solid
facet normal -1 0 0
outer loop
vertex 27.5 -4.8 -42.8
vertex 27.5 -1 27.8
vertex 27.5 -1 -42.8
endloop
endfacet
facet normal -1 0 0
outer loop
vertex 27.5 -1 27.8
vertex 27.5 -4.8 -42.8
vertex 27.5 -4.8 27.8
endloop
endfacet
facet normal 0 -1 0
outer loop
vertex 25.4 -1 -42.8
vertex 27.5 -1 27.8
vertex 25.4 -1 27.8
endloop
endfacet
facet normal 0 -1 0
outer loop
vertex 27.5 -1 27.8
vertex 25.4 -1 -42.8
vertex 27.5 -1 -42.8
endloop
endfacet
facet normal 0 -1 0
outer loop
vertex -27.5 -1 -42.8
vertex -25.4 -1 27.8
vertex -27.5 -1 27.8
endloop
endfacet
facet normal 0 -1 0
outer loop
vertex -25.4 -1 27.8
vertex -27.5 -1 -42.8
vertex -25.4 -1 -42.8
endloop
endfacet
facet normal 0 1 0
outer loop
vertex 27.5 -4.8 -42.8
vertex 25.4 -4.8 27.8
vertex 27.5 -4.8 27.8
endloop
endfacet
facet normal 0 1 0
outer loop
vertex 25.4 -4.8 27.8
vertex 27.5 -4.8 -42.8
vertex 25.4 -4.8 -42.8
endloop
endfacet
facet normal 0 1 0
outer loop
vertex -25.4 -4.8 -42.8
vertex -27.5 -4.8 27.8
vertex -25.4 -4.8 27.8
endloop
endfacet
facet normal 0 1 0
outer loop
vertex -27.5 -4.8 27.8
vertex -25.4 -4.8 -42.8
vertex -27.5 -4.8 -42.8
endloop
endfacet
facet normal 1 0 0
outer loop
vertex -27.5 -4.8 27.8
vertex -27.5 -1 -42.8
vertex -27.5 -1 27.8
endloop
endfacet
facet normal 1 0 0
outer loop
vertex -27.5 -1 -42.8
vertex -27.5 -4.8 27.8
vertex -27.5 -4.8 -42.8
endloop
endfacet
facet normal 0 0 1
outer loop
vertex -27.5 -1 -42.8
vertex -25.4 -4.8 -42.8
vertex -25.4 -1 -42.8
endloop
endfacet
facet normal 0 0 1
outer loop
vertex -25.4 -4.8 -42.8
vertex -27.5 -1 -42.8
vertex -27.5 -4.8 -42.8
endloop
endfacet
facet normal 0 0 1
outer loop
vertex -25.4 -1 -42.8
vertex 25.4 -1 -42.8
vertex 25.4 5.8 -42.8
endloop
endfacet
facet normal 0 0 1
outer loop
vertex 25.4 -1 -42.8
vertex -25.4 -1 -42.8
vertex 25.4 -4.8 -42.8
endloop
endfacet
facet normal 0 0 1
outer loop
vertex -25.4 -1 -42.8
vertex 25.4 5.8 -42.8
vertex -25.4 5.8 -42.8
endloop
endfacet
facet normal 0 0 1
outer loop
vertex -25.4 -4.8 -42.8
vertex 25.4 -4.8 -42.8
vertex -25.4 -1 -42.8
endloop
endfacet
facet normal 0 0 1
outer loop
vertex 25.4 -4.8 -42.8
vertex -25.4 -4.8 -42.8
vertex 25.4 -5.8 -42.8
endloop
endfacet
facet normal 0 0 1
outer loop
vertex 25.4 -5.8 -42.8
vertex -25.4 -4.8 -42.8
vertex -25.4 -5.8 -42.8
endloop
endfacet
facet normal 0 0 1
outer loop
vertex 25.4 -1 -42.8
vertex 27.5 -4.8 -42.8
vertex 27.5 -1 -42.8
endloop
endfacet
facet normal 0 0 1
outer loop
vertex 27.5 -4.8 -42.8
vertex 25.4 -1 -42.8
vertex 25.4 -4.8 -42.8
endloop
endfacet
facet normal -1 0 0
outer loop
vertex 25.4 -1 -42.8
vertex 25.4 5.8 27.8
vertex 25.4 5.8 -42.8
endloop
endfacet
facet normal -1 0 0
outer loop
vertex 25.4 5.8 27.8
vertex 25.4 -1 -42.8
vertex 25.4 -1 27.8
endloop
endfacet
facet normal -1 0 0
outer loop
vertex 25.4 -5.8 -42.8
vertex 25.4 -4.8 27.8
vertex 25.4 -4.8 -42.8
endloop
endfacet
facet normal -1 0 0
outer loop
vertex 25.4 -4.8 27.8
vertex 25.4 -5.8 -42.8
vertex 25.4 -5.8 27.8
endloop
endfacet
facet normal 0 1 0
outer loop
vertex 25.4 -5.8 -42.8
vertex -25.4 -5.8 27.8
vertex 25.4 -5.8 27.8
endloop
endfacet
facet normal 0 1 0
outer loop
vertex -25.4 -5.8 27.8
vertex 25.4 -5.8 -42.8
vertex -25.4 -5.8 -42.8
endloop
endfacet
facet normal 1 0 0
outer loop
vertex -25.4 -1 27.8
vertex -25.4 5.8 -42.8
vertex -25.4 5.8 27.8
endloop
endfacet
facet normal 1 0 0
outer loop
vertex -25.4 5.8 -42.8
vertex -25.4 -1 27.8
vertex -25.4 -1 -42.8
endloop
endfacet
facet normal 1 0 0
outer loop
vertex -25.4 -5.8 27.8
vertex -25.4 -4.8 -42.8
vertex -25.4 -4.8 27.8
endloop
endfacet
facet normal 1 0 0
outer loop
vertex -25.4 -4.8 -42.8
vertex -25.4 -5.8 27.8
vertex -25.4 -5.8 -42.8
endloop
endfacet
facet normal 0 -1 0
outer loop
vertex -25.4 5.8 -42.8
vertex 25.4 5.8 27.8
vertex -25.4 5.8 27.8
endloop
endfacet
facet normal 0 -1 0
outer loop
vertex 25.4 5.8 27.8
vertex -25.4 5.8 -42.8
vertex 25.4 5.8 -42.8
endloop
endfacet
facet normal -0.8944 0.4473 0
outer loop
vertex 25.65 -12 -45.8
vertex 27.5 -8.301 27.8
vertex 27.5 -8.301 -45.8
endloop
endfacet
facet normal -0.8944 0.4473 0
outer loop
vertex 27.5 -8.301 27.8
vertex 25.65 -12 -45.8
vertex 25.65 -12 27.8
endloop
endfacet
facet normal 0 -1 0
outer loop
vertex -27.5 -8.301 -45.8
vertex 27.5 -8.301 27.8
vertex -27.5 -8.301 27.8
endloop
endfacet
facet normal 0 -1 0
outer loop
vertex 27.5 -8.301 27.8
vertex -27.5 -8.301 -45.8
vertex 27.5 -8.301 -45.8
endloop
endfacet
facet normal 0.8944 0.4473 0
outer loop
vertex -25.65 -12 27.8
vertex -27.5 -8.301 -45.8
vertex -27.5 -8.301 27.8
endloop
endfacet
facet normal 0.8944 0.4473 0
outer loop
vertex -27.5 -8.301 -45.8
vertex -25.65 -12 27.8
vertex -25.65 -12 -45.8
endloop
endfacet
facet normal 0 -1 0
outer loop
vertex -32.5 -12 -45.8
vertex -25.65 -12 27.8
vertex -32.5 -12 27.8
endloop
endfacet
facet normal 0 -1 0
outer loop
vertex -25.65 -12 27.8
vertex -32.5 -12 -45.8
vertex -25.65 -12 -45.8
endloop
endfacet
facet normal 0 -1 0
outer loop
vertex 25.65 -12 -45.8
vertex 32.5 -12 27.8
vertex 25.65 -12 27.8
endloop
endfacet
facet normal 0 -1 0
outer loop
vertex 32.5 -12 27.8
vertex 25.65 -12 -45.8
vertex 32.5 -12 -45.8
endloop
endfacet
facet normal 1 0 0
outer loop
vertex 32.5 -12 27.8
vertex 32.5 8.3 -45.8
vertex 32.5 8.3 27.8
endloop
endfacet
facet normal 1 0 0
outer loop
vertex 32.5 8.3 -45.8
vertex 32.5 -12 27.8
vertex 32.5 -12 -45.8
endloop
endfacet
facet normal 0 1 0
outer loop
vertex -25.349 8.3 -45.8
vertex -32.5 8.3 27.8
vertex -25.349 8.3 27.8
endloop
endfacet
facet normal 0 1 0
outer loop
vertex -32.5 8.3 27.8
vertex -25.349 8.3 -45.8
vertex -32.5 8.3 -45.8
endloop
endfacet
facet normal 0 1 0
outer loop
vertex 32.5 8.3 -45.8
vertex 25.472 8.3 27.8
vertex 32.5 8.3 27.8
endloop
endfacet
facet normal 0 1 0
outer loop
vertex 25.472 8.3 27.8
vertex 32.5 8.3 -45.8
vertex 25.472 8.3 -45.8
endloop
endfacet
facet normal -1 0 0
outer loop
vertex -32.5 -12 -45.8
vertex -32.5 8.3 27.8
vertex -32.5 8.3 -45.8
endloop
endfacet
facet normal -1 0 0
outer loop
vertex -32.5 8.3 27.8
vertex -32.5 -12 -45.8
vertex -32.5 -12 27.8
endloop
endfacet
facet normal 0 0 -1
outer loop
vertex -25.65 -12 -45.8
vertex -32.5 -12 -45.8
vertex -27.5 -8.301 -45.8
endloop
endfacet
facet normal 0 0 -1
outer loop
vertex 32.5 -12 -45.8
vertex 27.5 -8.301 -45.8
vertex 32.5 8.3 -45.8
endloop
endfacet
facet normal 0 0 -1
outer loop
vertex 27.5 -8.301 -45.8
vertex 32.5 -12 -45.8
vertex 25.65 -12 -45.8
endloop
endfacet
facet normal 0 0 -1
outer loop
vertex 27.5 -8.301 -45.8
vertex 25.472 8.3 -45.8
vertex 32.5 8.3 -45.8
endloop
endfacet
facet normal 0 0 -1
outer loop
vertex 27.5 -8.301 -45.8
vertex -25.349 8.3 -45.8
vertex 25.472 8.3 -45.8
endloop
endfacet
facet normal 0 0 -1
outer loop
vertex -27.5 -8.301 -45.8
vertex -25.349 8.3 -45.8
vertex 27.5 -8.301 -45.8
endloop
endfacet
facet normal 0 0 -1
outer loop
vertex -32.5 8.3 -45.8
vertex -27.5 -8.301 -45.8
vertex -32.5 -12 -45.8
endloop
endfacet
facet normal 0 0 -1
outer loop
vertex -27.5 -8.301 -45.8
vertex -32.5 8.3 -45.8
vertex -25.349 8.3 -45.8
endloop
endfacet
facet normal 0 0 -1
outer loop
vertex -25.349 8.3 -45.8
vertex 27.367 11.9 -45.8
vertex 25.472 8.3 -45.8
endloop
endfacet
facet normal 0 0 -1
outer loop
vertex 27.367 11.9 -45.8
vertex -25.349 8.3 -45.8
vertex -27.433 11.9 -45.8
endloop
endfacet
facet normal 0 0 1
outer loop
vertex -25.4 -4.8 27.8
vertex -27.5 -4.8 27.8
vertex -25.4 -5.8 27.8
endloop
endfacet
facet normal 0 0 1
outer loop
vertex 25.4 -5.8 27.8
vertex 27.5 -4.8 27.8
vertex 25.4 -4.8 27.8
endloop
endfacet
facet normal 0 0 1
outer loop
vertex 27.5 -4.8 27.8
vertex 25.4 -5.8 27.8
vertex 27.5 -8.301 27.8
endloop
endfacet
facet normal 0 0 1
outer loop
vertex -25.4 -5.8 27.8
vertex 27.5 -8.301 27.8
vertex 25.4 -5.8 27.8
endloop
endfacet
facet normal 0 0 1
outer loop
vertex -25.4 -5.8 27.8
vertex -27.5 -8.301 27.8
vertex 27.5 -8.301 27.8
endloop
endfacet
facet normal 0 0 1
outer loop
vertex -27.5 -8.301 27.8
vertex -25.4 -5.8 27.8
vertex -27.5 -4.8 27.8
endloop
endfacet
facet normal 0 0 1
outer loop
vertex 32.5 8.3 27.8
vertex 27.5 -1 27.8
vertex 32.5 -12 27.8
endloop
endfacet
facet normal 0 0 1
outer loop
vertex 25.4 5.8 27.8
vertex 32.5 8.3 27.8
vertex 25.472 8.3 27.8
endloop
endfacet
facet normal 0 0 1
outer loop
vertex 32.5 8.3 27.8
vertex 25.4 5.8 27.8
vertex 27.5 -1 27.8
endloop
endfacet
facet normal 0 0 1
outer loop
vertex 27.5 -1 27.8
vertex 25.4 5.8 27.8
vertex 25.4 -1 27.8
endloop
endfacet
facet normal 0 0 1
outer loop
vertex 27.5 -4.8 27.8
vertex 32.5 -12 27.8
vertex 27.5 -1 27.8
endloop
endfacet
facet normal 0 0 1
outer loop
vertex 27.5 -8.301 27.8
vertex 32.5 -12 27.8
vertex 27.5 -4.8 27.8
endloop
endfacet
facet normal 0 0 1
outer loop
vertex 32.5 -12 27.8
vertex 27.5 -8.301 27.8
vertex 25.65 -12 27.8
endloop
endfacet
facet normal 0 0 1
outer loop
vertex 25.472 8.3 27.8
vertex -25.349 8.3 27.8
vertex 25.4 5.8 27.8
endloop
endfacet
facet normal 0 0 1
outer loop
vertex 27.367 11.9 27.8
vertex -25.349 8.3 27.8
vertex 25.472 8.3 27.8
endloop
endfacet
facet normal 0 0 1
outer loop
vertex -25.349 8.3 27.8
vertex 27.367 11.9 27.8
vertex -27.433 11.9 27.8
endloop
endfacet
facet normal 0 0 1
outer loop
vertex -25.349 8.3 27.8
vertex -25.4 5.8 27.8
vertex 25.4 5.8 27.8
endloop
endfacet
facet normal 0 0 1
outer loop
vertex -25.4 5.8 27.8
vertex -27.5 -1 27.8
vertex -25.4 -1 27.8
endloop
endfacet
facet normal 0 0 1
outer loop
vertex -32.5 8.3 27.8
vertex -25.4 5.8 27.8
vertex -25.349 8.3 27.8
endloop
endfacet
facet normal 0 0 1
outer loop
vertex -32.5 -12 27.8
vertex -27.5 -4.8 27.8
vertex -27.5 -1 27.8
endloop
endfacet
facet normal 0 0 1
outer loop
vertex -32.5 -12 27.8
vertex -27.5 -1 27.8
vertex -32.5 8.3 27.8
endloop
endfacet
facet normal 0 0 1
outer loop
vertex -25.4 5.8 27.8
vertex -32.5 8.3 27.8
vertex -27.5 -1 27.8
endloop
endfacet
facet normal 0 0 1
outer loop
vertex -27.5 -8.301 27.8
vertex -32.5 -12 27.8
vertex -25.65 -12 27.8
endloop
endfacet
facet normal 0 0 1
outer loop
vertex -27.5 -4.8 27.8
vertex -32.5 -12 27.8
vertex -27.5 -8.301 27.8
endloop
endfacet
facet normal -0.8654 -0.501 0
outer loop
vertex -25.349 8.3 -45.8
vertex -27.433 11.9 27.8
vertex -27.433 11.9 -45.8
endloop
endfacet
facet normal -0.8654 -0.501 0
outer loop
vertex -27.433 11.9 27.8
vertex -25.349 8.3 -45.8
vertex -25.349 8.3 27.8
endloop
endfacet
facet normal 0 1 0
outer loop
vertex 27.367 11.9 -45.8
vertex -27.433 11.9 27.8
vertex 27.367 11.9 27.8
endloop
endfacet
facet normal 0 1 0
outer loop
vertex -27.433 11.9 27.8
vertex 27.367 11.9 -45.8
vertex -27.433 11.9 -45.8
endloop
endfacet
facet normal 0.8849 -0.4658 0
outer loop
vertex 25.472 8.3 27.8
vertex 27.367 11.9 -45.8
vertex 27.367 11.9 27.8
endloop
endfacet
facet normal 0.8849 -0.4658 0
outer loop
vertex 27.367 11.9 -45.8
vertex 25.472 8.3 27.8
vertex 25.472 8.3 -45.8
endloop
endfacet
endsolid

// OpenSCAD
// file: lib/dovetail.scad
/**
 * dovetail.scad
 * A dovetail generator to easily lock modular pieces together.
 *
 * @author Nathan Campos <nathan@innoveworkshop.com>
 */

eps = 0.001;

/**
 * Creates a 2D trapezoid with a shrinking tolerance factor.
 *
 * @param w   Major width of the trapezoid.
 * @param h   Height of the trapezoid.
 * @param a   Side angle of the trapezoid.
 * @param tol Absolute amount to shrink the part as a whole.
 */
module trapezoid(w, h = 4, a = 2, tol = 0.4) {
	function at(val, t) = val + (tol / 2);
	function st(val, t) = val - (tol / 2);
	
	translate([st(-(w / 2)), st(-(h / 2)), 0])
		polygon(points = [[at(a), 0], [0, st(h)], [st(w), st(h)],
			[st(w - a), 0]]);
}

/**
 * Creates a male or female dovetail joint.
 *
 * @param gender Dovetail gender. ("male" or "female")
 * @param w      Width of the mating face.
 * @param d      Depth of the mating face.
 * @param sm     Margin from the side of the mating face to the end of the
 *               dovetail joint.
 * @param th     Dovetail trapezoid height.
 * @param ta     Side angle of the dovetail trapezoid.
 * @param tol    Absolute tolerance of the fit.
 */
module dovetail(gender, w, d, sm = 5, th = 4, ta = 2, tol = 0.4) {
	dt_eps = 0.001;

	if (gender == "male") {
		// Male Dovetail.
		translate([tol / 1.5, d / 2, th / 2])
		rotate([90, 0, 0])
		linear_extrude(d)
			trapezoid(w - (sm * 2), th, ta, tol);
	} else if (gender == "female") {
		union() {
			// Female dovetail.
			translate([0, (d / 2) + (dt_eps / 2), th / 2])
			rotate([90, 0, 0])
			linear_extrude(d + dt_eps)
				trapezoid(w - (sm * 2), th, ta, 0);
			
			// Tolerance of the fit. Removes a bit of height from the
			// mating surface.
			cube([w + dt_eps, d + dt_eps, tol + 0.2 + dt_eps], center = true);
		}
	} else {
		// Unknown gender.
		assert(false, "Unknown dovetail gender");
	}
}

/**
 * Creates a cap for a male dovetail to cover the last object in a modular
 * system.
 *
 * @param w Dovetail surface width.
 * @param d Dovetail surface depth.
 * @param h Cap height.
 */
module dovetail_cap(w, d, h) {
	difference() {
		cube([w, d, h], center = true);
	
		translate([0, 0, -h / 2])
			dovetail("female", w, d);
	}
}
// main file
/**
 * pcmcia-modular-organizer.scad
 * A modular PCMCIA card organizer tower.
 *
 * @author Nathan Campos <nathan@innoveworkshop.com>
 */

use <lib/dovetail.scad>

thing_to_build = "type3";  // type2, type3, base, top2, top3

// Generation parameters.
eps = 0.001;      // Epsilon overlap. 
side_wall = 5;    // Side wall width.
dt_margin = 2.5;  // Margin between the slot and the dovetail.
expo_depth = 15;  // Depth of card to leave exposed in front.

// PCMCIA card dimensions.
// For more information about the spec:
// https://support.dynabook.com/support/viewContentDetail?contentId=108256
pcmcia_depth = 85.6;     // Overall depth.
pcmcia_width = 55.0;     // Overall width.
pcmcia_cwidth = 50.8;    // Center section width.
pcmcia_cheight2 = 5.8;   // Center section height for Type II.
pcmcia_xcheight3 = 6.8;  // Center section extra height for Type III.
pcmcia_rheight = 3.8;    // Rail guide height.

/**
 * Build a thing!
 *
 * @param thing The thing to be built. Can be "type2", "type3",
 *              "base", "top2", "top3".
 */
module build_thing(thing) {	
	rotate([-90, 0, 0])
	if (thing == "type2") {
		// Build up the Type II enclosure.
		slot_module(2, expo_depth);
	} else if (thing == "type3") {
		// Build up the Type III enclosure.
		slot_module(3, expo_depth);
	} else if (thing == "top2") {
		// Build up the Type II top cap enclosure.
		slot_module(2, expo_depth, topdt = false);
	} else if (thing == "top3") {
		// Build up the Type III top cap enclosure.
		slot_module(3, expo_depth, topdt = false);
	} else if (thing == "base") {
		// Build the tapered base.
		module_base_tapered(10, 10, expo_depth);
	} else {
		assert(false, "Unknown thing");
	}
}

/**
 * Gets the height of a PCMCIA card depending on its type.
 *
 * @param  type Type of the PCMCIA card. (Can be 2 or 3)
 *
 * @return Height of the PCMCIA card.
 */
function pcmcia_height(type = 2) =
	(type == 2) ? pcmcia_cheight2 : (pcmcia_rheight + ((pcmcia_cheight2 - pcmcia_rheight) / 2) + pcmcia_xcheight3);

/**
 * Generates a PCMCIA card slot.
 *
 * @param type Type of the PCMCIA card. (Can be 2 or 3)
 */
module pcmcia_slot(type = 2) {
	// Ensure we have a correct type.
	assert((type >= 2) && (type <= 3));

	union() {
		// Common rail guides for all types.
		cube([pcmcia_width, pcmcia_depth, pcmcia_rheight], center = true);
		cube([pcmcia_cwidth, pcmcia_depth, pcmcia_cheight2], center = true);
	
		// Extra height for Type III cards.
		if (type == 3) {
			translate([0, 0, (pcmcia_xcheight3 + pcmcia_rheight) / 2])
				cube([pcmcia_cwidth, pcmcia_depth, pcmcia_xcheight3], center = true);
		}
	}
}

/**
 * Builds an organizer module.
 *
 * @param type     Type of the PCMCIA card. (Can be 2 or 3)
 * @param exposed  Exposed card depth.
 * @param backface Depth of the backface of the enclosure.
 * @param topdt    Should the top dovetail be included?
 */
module slot_module(type, exposed, backface = 3, topdt = true) {
	// Correct the offset for Type III cards.
	function slot_offset(type) =
		(type == 3) ? (pcmcia_xcheight3 - ((pcmcia_cheight2 - pcmcia_rheight) / 2)) / 2 : 0;
	
	// Sizing and positioning.
	yo = (exposed / 2) + (backface / 2);
	mw = pcmcia_width + (side_wall * 2);
	md = pcmcia_depth - exposed + backface;
	mh = pcmcia_height(type) + (dt_margin * 2);
	
	union() {
		color("red")
		translate([0, yo, mh / 2])
		if (topdt) {
			// Top male dovetail.
			dovetail("male", mw, md);
		} else {
			// Top cap.
			translate([0, 0, 2 - eps])
				cube([mw, md, 4], center = true);
		}

		// The enclosure itself.
		difference() {
			// Outer case.
			translate([0, yo, -2])
				cube([mw, md, mh + 4], center = true);
			
			// Slot.
			color("pink")
			translate([0, 0, slot_offset(type) * -1])
				pcmcia_slot(type);
		
			// Bottom female dovetail.
			color("teal")
			translate([0, yo, -(mh / 2) - 4 - eps])
				dovetail("female", mw, md);
		}
	}
}

/**
 * Builds a top cap for a module, hiding the ugly dovetail.
 *
 * @param exposed  Exposed card depth.
 * @param backface Depth of the backface of the enclosure.
 * @param h        Height of the cap.
 */
module module_cap(exposed, backface = 3, h = 8) {
	// Sizing and positioning.
	yo = (exposed / 2) + (backface / 2);
	mw = pcmcia_width + (side_wall * 2);
	md = pcmcia_depth - exposed + backface;

	translate([0, yo, 0])
		dovetail_cap(mw, md, h);
}

/**
 * Builds a PS2-inspired bottom base for a module, hiding the ugly
 * dovetail.
 *
 * @param side_width Width of the sides of the base.
 * @param sunken     Height to sunken the module into the base.
 * @param exposed    Exposed card depth.
 * @param backface   Depth of the backface of the enclosure.
 * @param h          Height of the cap.
 * @param tol        Tolerance given between the module and base sides.
 */
module module_base_tapered(side_width, sunken, exposed,
		backface = 3, h = 20, tol = .8) {
	// Sizing and positioning.
	yo = (exposed / 2) + (backface / 2);
	mw = pcmcia_width + (side_wall * 2);
	md = pcmcia_depth - exposed + backface;
	bw = mw + (2 * side_width);
	dth = 4;

	translate([0, yo, 0])
	union() {
		// Top male dovetail.
		color("red")
		translate([0, 0, (h / 2) - sunken])
			dovetail("male", mw, md);
		
		// Base itself.
		difference() {
			// Base shape.
			translate([0, (md / 2), 0])
			rotate([90, 180, 0])
			linear_extrude(md)
				trapezoid(bw, h, side_width, 0);

			// Sunken block.
			color("teal")
			translate([0, 0, (h / 2) - (sunken / 2)])
				cube([mw + tol, md + tol, sunken + eps], center = true);
		}
	}
}

// Build the thing!
build_thing(thing_to_build);
